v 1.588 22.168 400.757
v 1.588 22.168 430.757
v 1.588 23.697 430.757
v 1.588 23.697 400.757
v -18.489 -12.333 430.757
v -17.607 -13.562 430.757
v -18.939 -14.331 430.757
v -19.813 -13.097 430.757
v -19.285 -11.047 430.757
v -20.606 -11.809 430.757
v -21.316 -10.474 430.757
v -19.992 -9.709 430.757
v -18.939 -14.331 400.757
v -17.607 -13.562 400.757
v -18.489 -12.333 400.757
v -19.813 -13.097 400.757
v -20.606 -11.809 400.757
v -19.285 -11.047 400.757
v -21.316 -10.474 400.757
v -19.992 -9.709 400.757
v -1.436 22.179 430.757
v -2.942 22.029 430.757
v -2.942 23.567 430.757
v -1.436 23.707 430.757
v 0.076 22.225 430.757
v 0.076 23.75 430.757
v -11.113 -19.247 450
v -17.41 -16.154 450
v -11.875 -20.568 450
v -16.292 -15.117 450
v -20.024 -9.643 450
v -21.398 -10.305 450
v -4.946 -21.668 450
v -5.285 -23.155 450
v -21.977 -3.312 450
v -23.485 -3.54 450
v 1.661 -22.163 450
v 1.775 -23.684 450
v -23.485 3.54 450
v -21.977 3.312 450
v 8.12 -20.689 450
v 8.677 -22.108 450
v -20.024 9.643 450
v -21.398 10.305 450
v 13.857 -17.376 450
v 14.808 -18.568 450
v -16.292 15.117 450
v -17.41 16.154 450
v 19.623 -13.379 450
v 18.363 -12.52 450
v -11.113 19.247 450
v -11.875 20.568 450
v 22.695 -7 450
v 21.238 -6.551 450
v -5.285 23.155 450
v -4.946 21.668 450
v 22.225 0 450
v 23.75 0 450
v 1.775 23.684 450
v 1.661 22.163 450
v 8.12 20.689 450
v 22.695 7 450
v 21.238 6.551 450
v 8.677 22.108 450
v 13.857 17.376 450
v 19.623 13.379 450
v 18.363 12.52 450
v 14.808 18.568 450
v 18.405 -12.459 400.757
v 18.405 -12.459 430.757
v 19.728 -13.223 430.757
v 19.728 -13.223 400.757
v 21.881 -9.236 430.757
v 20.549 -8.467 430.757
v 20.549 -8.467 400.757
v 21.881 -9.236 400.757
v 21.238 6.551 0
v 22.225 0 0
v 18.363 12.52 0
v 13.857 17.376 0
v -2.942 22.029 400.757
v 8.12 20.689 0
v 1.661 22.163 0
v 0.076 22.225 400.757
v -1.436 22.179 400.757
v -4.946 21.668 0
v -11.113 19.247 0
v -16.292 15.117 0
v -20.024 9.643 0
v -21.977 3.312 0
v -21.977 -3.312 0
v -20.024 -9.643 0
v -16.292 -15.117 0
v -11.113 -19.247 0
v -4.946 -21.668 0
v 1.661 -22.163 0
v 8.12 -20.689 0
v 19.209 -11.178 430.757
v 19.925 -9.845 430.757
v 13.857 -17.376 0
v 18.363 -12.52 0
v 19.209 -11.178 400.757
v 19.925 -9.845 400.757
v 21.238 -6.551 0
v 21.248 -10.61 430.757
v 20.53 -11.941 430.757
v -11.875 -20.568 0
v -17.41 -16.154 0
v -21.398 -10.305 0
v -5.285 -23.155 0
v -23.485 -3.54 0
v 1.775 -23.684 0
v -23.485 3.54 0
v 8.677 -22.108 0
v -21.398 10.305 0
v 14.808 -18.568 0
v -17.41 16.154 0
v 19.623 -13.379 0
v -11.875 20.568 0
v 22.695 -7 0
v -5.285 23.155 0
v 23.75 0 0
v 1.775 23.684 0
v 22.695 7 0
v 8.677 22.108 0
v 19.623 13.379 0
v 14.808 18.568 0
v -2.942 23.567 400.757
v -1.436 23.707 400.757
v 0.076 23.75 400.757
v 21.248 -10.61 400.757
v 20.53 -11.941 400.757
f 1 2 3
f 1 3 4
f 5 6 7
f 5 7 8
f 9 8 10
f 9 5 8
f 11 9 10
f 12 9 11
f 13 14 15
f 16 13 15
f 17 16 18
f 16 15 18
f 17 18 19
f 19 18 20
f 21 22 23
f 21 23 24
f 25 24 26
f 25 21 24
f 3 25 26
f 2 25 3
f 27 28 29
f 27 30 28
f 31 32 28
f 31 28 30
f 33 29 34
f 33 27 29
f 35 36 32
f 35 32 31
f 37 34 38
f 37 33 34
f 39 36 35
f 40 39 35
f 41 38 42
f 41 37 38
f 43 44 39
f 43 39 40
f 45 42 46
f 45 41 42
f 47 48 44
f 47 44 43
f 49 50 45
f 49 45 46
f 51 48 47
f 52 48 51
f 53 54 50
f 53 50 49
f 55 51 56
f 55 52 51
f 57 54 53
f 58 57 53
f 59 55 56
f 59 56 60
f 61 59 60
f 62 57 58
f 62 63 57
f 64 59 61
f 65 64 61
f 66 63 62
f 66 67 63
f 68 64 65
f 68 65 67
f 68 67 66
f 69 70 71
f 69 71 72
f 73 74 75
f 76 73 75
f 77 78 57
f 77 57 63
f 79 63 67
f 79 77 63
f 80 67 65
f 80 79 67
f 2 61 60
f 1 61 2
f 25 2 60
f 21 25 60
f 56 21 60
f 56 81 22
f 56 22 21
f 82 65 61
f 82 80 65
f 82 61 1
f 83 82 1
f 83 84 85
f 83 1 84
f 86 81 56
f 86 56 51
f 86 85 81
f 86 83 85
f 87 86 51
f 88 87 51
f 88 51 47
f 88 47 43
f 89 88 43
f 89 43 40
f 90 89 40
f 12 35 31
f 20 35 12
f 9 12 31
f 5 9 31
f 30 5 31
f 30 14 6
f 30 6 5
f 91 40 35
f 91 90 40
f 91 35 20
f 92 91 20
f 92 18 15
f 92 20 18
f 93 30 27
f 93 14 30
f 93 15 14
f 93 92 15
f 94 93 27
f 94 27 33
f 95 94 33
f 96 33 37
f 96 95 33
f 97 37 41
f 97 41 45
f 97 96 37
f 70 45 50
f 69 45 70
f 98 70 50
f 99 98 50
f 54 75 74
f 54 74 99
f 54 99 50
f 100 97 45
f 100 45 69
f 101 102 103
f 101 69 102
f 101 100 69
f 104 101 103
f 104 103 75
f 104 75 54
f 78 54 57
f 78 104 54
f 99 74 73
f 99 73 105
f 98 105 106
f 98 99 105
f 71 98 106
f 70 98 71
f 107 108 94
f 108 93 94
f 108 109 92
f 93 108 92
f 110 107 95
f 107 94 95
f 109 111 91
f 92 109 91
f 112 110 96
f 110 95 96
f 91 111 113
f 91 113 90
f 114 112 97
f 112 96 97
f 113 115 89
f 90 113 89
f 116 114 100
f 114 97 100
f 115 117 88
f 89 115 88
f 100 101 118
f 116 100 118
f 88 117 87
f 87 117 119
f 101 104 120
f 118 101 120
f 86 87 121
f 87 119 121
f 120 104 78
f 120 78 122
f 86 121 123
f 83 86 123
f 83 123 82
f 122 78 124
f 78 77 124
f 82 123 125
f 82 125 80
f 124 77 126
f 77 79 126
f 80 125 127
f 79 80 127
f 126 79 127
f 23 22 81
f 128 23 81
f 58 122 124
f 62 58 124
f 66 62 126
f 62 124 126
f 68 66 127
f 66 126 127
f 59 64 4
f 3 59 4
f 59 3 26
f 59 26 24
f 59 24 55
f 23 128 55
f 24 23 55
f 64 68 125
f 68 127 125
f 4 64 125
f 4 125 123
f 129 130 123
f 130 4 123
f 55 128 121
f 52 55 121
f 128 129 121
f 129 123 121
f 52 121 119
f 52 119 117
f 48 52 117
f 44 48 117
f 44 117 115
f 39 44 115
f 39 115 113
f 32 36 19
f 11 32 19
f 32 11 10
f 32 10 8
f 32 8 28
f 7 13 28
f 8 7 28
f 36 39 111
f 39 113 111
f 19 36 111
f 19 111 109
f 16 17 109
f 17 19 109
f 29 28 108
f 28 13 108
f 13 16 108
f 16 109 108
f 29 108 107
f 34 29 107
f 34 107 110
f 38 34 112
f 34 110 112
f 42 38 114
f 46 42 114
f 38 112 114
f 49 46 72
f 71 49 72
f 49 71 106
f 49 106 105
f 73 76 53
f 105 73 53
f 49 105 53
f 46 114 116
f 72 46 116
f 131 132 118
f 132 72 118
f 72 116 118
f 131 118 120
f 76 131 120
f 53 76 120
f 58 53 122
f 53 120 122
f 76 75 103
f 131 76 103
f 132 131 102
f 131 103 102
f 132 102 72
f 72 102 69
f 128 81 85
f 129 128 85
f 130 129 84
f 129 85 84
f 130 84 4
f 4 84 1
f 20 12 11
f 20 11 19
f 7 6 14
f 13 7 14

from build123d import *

# Parameters (mm, degrees)
SKETCH1_R           = 23.75
SKETCH1_R_2         = 22.225
BOSS_EXTRUDE1_DEPTH = 450
CUT_EXTRUDE1_START  = -77.970542
SKETCH2_W           = 4.52920266
SKETCH2_H           = 30
CUT_EXTRUDE1_DEPTH  = 1.720542
CIRPATTERN2_COUNT   = 3


with BuildPart() as part:
    # Sketch1 → Boss-Extrude1 (new body)
    with BuildSketch(Plane.XY):
        Circle(SKETCH1_R)
        Circle(SKETCH1_R_2, mode=Mode.SUBTRACT)
    extrude(amount=BOSS_EXTRUDE1_DEPTH)

    # Sketch2 → Cut-Extrude1 (cut)
    with BuildSketch(Plane(origin=(0, 100, 0), x_dir=(1, 0, 0), z_dir=(0, 1, 0)).offset(CUT_EXTRUDE1_START)):
        with Locations((-0.67710133, -415.7565327)):
            Rectangle(SKETCH2_W, SKETCH2_H)
    cut_extrude1 = extrude(amount=CUT_EXTRUDE1_DEPTH, mode=Mode.SUBTRACT)

    # CirPattern2: Cut-Extrude1 ×3 about axis
    cirpattern2_axis = Axis((0, 0, 0), (0, 0, 1))
    for i in range(1, CIRPATTERN2_COUNT):
        add(cut_extrude1.rotate(cirpattern2_axis, i * 360 / CIRPATTERN2_COUNT), mode=Mode.SUBTRACT)


solid = part.part
